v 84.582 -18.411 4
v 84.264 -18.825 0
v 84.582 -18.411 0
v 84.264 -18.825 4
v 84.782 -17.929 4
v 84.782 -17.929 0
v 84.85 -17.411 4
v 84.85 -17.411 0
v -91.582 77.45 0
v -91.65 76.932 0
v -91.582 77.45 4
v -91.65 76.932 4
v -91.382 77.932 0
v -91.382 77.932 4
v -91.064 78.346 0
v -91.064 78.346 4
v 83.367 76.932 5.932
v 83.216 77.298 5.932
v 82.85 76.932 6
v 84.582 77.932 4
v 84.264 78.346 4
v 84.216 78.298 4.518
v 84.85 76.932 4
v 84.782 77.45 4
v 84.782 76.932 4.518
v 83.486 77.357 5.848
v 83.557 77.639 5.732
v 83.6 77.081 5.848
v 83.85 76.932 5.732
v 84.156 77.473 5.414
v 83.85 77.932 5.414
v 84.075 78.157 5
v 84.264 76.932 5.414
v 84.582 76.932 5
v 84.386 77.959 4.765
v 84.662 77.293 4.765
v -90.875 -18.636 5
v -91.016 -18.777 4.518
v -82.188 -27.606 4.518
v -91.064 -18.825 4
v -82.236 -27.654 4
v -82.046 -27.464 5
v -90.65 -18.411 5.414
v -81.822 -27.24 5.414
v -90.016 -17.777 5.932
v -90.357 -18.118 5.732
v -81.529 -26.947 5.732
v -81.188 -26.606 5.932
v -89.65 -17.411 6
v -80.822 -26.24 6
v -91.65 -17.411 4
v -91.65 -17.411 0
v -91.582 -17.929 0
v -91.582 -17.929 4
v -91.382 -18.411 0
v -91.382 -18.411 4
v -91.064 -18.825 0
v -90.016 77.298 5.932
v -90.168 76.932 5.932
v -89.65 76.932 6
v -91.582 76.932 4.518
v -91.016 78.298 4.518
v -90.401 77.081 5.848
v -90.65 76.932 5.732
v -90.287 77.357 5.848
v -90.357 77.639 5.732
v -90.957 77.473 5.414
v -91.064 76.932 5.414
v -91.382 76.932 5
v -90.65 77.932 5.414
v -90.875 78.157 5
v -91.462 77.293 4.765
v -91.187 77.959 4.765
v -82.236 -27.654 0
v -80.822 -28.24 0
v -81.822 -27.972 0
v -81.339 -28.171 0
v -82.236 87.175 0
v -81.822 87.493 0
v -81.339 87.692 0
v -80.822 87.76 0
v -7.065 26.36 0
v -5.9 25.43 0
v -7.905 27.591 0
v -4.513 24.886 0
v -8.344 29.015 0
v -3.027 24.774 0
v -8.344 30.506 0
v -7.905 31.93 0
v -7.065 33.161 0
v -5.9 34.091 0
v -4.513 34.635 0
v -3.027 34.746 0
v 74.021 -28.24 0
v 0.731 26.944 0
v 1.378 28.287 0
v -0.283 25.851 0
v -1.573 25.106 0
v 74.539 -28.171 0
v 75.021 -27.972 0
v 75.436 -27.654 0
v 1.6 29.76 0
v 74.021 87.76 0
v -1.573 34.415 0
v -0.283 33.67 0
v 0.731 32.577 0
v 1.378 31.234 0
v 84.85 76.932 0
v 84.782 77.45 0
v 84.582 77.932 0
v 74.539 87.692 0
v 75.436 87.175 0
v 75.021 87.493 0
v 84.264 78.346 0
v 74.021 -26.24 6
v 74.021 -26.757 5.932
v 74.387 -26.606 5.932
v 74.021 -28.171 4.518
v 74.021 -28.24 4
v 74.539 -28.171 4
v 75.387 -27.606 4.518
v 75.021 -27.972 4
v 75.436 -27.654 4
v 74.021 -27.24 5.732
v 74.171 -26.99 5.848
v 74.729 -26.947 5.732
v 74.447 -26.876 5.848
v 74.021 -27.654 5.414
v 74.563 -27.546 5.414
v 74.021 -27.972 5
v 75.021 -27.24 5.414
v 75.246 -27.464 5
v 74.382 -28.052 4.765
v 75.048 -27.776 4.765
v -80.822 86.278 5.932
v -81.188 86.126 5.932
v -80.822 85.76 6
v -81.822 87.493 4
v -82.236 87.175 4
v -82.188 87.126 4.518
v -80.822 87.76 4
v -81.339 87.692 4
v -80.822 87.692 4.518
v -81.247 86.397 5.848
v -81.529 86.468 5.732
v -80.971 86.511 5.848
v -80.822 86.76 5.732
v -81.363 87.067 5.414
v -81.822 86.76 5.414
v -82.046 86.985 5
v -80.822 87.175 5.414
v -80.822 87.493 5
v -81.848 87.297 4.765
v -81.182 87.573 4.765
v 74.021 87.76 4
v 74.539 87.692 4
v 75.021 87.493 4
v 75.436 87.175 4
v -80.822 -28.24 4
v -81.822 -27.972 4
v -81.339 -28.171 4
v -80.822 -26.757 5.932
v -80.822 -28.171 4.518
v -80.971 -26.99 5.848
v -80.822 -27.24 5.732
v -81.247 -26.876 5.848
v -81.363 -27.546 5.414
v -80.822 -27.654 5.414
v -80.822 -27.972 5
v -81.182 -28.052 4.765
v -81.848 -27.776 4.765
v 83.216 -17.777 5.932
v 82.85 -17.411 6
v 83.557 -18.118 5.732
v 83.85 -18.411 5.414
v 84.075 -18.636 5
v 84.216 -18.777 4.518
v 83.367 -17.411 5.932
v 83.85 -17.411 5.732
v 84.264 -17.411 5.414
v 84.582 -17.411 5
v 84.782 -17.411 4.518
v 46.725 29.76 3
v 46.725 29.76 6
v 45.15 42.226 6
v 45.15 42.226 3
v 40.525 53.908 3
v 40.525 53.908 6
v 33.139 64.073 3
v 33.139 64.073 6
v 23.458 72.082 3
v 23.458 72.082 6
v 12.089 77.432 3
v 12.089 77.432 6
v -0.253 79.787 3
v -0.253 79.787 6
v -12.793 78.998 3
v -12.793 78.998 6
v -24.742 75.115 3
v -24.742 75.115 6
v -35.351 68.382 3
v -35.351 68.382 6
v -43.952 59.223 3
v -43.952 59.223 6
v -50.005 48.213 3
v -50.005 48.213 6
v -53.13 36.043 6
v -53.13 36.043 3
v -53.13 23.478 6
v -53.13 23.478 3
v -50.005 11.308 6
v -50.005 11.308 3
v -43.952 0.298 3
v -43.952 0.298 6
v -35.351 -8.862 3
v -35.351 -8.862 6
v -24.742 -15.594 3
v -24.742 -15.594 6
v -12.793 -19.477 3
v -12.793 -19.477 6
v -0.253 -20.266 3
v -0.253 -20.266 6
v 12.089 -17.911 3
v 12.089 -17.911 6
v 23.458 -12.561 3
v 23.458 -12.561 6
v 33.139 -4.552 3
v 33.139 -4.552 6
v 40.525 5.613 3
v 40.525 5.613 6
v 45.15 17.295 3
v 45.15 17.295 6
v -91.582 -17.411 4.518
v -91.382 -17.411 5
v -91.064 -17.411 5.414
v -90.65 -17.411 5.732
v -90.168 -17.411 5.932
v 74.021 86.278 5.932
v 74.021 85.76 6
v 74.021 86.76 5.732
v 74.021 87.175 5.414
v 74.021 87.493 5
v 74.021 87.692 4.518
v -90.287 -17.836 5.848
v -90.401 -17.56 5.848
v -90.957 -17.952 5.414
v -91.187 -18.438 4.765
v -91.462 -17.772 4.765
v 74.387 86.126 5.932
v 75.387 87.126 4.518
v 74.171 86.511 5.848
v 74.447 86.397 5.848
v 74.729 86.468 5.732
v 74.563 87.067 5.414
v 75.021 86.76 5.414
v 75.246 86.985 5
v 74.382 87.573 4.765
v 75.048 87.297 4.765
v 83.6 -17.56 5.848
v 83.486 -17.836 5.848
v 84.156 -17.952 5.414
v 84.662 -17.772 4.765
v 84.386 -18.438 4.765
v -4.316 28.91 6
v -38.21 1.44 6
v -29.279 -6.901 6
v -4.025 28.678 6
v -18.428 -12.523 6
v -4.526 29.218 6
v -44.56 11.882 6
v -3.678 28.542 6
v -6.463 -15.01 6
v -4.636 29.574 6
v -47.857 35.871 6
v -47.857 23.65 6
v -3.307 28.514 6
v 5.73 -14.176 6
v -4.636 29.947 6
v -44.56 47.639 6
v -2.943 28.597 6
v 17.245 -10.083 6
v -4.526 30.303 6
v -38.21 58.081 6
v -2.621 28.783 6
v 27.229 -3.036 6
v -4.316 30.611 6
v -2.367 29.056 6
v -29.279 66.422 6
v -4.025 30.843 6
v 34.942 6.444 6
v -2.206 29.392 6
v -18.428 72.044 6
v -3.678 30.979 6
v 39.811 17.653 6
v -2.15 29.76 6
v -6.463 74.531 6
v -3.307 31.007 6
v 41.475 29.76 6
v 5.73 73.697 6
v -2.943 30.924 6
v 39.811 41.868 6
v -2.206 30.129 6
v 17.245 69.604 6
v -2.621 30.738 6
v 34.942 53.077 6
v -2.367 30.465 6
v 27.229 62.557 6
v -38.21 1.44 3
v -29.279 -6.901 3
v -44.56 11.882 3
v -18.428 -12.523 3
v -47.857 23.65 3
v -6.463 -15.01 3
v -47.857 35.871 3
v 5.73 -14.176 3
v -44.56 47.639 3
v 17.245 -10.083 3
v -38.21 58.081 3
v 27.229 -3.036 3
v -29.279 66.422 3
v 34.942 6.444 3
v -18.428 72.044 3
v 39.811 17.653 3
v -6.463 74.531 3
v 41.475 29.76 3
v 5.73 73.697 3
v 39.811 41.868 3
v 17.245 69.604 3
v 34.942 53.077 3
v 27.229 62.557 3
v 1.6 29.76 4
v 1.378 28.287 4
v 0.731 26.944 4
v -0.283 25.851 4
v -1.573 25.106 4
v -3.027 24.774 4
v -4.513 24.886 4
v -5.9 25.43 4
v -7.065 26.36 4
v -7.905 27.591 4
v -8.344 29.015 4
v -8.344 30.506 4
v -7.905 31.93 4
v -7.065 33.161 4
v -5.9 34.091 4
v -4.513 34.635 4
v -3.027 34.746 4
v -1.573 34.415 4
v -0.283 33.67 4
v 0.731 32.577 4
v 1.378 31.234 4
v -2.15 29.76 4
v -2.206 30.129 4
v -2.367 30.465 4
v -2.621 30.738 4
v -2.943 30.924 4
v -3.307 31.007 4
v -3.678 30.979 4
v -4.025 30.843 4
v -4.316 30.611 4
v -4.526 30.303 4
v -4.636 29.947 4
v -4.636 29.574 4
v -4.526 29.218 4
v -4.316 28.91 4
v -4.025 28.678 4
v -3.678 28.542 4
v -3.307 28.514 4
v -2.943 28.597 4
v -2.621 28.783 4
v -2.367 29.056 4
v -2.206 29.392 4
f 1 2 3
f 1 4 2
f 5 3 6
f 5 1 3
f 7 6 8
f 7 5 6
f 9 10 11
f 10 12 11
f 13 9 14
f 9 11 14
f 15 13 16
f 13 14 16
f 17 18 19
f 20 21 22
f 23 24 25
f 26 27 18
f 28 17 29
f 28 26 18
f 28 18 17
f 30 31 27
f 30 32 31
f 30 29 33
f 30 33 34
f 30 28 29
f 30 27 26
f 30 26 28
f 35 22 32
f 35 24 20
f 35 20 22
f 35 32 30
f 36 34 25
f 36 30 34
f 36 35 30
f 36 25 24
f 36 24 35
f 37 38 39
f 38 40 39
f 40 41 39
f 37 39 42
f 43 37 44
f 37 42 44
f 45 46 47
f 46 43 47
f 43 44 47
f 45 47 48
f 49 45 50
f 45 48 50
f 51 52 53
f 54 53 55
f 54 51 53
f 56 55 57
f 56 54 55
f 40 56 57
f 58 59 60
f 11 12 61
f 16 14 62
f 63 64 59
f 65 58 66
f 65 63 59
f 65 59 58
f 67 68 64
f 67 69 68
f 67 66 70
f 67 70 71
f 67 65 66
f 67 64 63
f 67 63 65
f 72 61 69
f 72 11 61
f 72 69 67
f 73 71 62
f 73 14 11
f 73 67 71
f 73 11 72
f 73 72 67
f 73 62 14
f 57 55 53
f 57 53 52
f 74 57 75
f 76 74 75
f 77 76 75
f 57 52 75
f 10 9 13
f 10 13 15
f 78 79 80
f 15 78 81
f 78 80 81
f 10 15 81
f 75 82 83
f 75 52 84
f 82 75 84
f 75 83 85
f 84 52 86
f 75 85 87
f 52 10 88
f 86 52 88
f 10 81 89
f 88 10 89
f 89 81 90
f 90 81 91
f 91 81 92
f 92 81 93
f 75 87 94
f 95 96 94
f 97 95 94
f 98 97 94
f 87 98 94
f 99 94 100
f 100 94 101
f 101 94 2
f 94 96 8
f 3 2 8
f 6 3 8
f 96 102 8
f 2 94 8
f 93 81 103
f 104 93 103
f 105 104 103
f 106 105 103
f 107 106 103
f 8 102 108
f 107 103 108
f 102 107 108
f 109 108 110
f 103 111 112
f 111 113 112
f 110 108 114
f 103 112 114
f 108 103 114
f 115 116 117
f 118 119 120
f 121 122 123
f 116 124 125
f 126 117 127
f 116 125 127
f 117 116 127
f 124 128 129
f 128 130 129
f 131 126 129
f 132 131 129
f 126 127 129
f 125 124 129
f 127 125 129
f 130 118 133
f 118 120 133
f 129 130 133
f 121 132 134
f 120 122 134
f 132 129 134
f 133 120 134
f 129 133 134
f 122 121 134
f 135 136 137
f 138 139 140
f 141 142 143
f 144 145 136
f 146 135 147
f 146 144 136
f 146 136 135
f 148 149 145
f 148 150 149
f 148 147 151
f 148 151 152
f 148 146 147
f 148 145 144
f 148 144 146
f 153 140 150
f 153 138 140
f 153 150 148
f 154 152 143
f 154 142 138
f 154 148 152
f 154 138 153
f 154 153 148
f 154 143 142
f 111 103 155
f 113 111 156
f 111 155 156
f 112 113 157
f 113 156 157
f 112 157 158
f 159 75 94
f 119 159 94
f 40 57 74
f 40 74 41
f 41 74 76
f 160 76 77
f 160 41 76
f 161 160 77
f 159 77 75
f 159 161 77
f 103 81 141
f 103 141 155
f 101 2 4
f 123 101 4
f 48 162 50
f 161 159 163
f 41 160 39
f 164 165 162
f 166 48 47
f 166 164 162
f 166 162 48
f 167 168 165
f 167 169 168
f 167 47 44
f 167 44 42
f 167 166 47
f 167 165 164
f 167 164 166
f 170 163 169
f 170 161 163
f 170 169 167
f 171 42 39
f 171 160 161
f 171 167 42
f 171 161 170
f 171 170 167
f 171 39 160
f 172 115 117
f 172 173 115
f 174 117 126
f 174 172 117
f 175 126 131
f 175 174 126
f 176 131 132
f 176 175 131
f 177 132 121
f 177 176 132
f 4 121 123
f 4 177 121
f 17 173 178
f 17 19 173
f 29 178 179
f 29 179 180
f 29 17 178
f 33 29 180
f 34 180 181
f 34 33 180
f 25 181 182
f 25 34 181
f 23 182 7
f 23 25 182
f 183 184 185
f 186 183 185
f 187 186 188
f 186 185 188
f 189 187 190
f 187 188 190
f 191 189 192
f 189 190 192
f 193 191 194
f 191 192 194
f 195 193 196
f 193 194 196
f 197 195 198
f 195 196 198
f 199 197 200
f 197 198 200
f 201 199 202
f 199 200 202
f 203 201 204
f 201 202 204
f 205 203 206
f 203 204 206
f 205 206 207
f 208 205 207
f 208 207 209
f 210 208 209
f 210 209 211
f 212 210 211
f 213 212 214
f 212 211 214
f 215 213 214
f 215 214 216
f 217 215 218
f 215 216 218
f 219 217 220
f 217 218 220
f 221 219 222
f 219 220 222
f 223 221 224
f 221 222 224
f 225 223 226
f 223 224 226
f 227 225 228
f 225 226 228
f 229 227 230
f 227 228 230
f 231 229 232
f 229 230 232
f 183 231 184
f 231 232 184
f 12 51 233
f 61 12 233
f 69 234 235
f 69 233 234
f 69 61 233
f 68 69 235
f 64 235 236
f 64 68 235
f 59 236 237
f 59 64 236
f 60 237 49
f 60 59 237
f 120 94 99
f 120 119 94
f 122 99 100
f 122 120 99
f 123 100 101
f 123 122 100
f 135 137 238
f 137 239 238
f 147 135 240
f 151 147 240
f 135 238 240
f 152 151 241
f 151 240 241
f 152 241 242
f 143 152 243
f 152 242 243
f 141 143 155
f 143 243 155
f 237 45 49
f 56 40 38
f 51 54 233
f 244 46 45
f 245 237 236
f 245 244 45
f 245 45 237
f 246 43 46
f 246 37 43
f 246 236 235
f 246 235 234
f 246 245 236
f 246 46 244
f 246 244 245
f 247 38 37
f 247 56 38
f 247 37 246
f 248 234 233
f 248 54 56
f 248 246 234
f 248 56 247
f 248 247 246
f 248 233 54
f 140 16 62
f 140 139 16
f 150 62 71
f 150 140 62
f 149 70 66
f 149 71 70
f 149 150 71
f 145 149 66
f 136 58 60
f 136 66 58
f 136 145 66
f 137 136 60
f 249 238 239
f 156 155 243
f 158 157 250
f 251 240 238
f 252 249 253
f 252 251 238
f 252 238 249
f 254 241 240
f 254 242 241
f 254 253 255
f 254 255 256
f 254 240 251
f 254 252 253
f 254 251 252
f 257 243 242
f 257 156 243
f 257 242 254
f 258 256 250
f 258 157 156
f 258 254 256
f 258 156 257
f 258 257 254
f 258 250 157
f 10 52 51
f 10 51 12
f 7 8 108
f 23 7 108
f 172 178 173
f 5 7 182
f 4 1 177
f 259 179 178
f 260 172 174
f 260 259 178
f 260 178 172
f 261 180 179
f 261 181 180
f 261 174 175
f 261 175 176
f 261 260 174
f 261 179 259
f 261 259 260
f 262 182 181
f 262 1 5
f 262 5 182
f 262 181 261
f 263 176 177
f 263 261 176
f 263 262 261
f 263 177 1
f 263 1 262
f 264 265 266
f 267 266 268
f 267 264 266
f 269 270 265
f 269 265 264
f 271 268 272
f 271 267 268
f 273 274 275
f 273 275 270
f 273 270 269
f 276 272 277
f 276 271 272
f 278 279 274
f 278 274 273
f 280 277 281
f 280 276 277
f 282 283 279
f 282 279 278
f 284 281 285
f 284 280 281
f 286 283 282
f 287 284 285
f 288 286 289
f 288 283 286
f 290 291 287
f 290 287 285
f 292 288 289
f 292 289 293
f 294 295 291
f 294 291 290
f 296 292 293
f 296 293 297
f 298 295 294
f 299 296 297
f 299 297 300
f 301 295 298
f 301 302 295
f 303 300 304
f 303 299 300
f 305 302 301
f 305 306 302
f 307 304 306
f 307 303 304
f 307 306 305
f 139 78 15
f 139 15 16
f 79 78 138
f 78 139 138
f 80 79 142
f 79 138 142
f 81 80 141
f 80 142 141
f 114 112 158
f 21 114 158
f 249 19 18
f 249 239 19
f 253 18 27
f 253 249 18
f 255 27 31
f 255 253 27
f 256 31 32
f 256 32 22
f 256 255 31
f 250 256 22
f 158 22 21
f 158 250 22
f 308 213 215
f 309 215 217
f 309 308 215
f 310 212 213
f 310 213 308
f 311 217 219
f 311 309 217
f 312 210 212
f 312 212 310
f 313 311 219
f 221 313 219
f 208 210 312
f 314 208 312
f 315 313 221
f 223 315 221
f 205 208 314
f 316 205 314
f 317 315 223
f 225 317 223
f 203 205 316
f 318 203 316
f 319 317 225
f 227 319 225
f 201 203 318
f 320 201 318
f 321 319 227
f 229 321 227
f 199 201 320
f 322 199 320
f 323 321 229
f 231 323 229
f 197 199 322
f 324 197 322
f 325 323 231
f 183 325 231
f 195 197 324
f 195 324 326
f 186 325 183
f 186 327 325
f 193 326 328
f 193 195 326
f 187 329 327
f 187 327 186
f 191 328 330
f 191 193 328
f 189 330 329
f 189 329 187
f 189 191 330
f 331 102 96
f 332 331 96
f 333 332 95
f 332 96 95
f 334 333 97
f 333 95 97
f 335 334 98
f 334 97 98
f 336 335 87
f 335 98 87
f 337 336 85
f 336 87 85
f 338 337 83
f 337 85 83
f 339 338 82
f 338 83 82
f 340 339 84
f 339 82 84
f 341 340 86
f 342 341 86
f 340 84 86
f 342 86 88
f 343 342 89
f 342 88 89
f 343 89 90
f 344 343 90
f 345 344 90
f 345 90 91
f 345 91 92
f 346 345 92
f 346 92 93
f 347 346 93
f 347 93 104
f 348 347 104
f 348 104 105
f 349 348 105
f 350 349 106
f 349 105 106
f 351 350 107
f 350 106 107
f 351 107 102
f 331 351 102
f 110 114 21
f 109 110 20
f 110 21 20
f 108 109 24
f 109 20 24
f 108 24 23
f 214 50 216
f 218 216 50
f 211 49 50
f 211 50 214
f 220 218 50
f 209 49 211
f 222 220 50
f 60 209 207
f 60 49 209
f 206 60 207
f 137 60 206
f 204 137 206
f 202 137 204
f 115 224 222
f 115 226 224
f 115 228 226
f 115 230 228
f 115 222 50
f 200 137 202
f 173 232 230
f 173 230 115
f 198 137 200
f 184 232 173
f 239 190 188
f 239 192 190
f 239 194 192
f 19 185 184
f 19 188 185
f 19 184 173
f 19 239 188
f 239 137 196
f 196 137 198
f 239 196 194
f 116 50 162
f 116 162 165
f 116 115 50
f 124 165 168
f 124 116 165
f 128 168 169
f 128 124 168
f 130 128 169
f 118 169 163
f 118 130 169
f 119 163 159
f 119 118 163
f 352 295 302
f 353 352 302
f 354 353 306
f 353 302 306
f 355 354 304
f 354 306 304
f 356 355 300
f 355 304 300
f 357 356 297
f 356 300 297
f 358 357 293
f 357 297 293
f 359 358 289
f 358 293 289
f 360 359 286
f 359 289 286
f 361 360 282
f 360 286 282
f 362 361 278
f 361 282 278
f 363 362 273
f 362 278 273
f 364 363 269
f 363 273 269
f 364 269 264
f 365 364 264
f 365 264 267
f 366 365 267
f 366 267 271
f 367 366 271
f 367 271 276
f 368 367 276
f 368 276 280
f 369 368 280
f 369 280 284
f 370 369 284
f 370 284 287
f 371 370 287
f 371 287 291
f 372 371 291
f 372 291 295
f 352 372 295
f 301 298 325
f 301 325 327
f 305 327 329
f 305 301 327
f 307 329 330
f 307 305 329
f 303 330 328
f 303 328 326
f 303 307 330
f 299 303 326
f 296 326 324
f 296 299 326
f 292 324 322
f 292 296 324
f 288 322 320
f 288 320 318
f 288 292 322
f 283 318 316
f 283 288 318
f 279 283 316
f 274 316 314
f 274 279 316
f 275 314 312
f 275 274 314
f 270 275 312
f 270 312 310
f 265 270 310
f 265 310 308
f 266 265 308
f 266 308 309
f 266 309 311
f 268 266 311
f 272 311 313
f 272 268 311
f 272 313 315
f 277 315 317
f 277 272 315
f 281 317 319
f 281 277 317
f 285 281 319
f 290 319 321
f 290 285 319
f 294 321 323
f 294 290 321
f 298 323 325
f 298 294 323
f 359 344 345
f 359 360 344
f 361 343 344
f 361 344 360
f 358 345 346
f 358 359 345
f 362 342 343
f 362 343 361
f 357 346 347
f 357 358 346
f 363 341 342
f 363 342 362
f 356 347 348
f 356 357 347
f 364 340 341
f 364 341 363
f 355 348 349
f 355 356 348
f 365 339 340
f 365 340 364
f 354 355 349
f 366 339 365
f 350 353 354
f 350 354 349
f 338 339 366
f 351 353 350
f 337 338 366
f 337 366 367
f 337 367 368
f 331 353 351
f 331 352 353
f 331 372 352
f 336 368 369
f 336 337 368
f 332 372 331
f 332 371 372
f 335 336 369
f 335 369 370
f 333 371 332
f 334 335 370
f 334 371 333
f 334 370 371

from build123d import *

# Parameters (mm, degrees)
F0_W     = 176.5
F0_H     = 116
F1_DEPTH = 6
F2_SIZE  = 10
F4_R     = 2
F3_R     = 50.125
F3_R_2   = 44.875
F5_DEPTH = 3
F3_R_3   = 1.25
F6_DEPTH = 6.001
F7_R     = 5
F8_DEPTH = 4


with BuildPart() as f1:
    # F0 (on Top) → F1 (new body)
    with BuildSketch(Plane.XY):
        with Locations((-3.4001671076, 29.7604629695)):
            Rectangle(F0_W, F0_H)
    extrude(amount=F1_DEPTH)

    # F2
    f2_edges = [f1.edges().sort_by_distance(p)[0] for p in [
        (-91.650167, -28.239537, 3),
        (84.849833, -28.239537, 3),
        (84.849833, 87.760463, 3),
        (-91.650167, 87.760463, 3),
    ]]
    chamfer(f2_edges, length=F2_SIZE)

    # F4
    f4_edges = [f1.edges().sort_by_distance(p)[0] for p in [
        (-3.400167, -28.239537, 6),
        (-86.650167, -23.239537, 6),
        (-91.650167, 29.760463, 6),
        (-86.650167, 82.760463, 6),
        (-3.400167, 87.760463, 6),
        (79.849833, 82.760463, 6),
        (84.849833, 29.760463, 6),
        (79.849833, -23.239537, 6),
        (-81.650167, -28.239537, 3),
        (-91.650167, -18.239537, 3),
        (-91.650167, 77.760463, 3),
        (-81.650167, 87.760463, 3),
        (74.849833, 87.760463, 3),
        (84.849833, 77.760463, 3),
        (84.849833, -18.239537, 3),
        (74.849833, -28.239537, 3),
    ]]
    fillet(f4_edges, radius=F4_R)

    # F3 (on face) → F5 (cut)
    with BuildSketch(Plane.XY.offset(6)):
        with Locations((-3.4001671076, 29.7604629695)):
            Circle(F3_R)
        with Locations((-3.4001671076, 29.7604629695)):
            Circle(F3_R_2, mode=Mode.SUBTRACT)
    extrude(amount=-F5_DEPTH, mode=Mode.SUBTRACT)

    # F3 (on face) → F6 (cut, through all)
    with BuildSketch(Plane.XY.offset(6)):
        with Locations((-3.4001671076, 29.7604629695)):
            Circle(F3_R_3)
    extrude(amount=-F6_DEPTH, mode=Mode.SUBTRACT)

    # F7 (on face) → F8 (cut)
    with BuildSketch(Plane(origin=(0, 0, 0), x_dir=(1, 0, 0), z_dir=(0, 0, -1))):
        with Locations((-3.4001671076, -29.7604629695)):
            Circle(F7_R)
    extrude(amount=-F8_DEPTH, mode=Mode.SUBTRACT)


solid = f1.part
